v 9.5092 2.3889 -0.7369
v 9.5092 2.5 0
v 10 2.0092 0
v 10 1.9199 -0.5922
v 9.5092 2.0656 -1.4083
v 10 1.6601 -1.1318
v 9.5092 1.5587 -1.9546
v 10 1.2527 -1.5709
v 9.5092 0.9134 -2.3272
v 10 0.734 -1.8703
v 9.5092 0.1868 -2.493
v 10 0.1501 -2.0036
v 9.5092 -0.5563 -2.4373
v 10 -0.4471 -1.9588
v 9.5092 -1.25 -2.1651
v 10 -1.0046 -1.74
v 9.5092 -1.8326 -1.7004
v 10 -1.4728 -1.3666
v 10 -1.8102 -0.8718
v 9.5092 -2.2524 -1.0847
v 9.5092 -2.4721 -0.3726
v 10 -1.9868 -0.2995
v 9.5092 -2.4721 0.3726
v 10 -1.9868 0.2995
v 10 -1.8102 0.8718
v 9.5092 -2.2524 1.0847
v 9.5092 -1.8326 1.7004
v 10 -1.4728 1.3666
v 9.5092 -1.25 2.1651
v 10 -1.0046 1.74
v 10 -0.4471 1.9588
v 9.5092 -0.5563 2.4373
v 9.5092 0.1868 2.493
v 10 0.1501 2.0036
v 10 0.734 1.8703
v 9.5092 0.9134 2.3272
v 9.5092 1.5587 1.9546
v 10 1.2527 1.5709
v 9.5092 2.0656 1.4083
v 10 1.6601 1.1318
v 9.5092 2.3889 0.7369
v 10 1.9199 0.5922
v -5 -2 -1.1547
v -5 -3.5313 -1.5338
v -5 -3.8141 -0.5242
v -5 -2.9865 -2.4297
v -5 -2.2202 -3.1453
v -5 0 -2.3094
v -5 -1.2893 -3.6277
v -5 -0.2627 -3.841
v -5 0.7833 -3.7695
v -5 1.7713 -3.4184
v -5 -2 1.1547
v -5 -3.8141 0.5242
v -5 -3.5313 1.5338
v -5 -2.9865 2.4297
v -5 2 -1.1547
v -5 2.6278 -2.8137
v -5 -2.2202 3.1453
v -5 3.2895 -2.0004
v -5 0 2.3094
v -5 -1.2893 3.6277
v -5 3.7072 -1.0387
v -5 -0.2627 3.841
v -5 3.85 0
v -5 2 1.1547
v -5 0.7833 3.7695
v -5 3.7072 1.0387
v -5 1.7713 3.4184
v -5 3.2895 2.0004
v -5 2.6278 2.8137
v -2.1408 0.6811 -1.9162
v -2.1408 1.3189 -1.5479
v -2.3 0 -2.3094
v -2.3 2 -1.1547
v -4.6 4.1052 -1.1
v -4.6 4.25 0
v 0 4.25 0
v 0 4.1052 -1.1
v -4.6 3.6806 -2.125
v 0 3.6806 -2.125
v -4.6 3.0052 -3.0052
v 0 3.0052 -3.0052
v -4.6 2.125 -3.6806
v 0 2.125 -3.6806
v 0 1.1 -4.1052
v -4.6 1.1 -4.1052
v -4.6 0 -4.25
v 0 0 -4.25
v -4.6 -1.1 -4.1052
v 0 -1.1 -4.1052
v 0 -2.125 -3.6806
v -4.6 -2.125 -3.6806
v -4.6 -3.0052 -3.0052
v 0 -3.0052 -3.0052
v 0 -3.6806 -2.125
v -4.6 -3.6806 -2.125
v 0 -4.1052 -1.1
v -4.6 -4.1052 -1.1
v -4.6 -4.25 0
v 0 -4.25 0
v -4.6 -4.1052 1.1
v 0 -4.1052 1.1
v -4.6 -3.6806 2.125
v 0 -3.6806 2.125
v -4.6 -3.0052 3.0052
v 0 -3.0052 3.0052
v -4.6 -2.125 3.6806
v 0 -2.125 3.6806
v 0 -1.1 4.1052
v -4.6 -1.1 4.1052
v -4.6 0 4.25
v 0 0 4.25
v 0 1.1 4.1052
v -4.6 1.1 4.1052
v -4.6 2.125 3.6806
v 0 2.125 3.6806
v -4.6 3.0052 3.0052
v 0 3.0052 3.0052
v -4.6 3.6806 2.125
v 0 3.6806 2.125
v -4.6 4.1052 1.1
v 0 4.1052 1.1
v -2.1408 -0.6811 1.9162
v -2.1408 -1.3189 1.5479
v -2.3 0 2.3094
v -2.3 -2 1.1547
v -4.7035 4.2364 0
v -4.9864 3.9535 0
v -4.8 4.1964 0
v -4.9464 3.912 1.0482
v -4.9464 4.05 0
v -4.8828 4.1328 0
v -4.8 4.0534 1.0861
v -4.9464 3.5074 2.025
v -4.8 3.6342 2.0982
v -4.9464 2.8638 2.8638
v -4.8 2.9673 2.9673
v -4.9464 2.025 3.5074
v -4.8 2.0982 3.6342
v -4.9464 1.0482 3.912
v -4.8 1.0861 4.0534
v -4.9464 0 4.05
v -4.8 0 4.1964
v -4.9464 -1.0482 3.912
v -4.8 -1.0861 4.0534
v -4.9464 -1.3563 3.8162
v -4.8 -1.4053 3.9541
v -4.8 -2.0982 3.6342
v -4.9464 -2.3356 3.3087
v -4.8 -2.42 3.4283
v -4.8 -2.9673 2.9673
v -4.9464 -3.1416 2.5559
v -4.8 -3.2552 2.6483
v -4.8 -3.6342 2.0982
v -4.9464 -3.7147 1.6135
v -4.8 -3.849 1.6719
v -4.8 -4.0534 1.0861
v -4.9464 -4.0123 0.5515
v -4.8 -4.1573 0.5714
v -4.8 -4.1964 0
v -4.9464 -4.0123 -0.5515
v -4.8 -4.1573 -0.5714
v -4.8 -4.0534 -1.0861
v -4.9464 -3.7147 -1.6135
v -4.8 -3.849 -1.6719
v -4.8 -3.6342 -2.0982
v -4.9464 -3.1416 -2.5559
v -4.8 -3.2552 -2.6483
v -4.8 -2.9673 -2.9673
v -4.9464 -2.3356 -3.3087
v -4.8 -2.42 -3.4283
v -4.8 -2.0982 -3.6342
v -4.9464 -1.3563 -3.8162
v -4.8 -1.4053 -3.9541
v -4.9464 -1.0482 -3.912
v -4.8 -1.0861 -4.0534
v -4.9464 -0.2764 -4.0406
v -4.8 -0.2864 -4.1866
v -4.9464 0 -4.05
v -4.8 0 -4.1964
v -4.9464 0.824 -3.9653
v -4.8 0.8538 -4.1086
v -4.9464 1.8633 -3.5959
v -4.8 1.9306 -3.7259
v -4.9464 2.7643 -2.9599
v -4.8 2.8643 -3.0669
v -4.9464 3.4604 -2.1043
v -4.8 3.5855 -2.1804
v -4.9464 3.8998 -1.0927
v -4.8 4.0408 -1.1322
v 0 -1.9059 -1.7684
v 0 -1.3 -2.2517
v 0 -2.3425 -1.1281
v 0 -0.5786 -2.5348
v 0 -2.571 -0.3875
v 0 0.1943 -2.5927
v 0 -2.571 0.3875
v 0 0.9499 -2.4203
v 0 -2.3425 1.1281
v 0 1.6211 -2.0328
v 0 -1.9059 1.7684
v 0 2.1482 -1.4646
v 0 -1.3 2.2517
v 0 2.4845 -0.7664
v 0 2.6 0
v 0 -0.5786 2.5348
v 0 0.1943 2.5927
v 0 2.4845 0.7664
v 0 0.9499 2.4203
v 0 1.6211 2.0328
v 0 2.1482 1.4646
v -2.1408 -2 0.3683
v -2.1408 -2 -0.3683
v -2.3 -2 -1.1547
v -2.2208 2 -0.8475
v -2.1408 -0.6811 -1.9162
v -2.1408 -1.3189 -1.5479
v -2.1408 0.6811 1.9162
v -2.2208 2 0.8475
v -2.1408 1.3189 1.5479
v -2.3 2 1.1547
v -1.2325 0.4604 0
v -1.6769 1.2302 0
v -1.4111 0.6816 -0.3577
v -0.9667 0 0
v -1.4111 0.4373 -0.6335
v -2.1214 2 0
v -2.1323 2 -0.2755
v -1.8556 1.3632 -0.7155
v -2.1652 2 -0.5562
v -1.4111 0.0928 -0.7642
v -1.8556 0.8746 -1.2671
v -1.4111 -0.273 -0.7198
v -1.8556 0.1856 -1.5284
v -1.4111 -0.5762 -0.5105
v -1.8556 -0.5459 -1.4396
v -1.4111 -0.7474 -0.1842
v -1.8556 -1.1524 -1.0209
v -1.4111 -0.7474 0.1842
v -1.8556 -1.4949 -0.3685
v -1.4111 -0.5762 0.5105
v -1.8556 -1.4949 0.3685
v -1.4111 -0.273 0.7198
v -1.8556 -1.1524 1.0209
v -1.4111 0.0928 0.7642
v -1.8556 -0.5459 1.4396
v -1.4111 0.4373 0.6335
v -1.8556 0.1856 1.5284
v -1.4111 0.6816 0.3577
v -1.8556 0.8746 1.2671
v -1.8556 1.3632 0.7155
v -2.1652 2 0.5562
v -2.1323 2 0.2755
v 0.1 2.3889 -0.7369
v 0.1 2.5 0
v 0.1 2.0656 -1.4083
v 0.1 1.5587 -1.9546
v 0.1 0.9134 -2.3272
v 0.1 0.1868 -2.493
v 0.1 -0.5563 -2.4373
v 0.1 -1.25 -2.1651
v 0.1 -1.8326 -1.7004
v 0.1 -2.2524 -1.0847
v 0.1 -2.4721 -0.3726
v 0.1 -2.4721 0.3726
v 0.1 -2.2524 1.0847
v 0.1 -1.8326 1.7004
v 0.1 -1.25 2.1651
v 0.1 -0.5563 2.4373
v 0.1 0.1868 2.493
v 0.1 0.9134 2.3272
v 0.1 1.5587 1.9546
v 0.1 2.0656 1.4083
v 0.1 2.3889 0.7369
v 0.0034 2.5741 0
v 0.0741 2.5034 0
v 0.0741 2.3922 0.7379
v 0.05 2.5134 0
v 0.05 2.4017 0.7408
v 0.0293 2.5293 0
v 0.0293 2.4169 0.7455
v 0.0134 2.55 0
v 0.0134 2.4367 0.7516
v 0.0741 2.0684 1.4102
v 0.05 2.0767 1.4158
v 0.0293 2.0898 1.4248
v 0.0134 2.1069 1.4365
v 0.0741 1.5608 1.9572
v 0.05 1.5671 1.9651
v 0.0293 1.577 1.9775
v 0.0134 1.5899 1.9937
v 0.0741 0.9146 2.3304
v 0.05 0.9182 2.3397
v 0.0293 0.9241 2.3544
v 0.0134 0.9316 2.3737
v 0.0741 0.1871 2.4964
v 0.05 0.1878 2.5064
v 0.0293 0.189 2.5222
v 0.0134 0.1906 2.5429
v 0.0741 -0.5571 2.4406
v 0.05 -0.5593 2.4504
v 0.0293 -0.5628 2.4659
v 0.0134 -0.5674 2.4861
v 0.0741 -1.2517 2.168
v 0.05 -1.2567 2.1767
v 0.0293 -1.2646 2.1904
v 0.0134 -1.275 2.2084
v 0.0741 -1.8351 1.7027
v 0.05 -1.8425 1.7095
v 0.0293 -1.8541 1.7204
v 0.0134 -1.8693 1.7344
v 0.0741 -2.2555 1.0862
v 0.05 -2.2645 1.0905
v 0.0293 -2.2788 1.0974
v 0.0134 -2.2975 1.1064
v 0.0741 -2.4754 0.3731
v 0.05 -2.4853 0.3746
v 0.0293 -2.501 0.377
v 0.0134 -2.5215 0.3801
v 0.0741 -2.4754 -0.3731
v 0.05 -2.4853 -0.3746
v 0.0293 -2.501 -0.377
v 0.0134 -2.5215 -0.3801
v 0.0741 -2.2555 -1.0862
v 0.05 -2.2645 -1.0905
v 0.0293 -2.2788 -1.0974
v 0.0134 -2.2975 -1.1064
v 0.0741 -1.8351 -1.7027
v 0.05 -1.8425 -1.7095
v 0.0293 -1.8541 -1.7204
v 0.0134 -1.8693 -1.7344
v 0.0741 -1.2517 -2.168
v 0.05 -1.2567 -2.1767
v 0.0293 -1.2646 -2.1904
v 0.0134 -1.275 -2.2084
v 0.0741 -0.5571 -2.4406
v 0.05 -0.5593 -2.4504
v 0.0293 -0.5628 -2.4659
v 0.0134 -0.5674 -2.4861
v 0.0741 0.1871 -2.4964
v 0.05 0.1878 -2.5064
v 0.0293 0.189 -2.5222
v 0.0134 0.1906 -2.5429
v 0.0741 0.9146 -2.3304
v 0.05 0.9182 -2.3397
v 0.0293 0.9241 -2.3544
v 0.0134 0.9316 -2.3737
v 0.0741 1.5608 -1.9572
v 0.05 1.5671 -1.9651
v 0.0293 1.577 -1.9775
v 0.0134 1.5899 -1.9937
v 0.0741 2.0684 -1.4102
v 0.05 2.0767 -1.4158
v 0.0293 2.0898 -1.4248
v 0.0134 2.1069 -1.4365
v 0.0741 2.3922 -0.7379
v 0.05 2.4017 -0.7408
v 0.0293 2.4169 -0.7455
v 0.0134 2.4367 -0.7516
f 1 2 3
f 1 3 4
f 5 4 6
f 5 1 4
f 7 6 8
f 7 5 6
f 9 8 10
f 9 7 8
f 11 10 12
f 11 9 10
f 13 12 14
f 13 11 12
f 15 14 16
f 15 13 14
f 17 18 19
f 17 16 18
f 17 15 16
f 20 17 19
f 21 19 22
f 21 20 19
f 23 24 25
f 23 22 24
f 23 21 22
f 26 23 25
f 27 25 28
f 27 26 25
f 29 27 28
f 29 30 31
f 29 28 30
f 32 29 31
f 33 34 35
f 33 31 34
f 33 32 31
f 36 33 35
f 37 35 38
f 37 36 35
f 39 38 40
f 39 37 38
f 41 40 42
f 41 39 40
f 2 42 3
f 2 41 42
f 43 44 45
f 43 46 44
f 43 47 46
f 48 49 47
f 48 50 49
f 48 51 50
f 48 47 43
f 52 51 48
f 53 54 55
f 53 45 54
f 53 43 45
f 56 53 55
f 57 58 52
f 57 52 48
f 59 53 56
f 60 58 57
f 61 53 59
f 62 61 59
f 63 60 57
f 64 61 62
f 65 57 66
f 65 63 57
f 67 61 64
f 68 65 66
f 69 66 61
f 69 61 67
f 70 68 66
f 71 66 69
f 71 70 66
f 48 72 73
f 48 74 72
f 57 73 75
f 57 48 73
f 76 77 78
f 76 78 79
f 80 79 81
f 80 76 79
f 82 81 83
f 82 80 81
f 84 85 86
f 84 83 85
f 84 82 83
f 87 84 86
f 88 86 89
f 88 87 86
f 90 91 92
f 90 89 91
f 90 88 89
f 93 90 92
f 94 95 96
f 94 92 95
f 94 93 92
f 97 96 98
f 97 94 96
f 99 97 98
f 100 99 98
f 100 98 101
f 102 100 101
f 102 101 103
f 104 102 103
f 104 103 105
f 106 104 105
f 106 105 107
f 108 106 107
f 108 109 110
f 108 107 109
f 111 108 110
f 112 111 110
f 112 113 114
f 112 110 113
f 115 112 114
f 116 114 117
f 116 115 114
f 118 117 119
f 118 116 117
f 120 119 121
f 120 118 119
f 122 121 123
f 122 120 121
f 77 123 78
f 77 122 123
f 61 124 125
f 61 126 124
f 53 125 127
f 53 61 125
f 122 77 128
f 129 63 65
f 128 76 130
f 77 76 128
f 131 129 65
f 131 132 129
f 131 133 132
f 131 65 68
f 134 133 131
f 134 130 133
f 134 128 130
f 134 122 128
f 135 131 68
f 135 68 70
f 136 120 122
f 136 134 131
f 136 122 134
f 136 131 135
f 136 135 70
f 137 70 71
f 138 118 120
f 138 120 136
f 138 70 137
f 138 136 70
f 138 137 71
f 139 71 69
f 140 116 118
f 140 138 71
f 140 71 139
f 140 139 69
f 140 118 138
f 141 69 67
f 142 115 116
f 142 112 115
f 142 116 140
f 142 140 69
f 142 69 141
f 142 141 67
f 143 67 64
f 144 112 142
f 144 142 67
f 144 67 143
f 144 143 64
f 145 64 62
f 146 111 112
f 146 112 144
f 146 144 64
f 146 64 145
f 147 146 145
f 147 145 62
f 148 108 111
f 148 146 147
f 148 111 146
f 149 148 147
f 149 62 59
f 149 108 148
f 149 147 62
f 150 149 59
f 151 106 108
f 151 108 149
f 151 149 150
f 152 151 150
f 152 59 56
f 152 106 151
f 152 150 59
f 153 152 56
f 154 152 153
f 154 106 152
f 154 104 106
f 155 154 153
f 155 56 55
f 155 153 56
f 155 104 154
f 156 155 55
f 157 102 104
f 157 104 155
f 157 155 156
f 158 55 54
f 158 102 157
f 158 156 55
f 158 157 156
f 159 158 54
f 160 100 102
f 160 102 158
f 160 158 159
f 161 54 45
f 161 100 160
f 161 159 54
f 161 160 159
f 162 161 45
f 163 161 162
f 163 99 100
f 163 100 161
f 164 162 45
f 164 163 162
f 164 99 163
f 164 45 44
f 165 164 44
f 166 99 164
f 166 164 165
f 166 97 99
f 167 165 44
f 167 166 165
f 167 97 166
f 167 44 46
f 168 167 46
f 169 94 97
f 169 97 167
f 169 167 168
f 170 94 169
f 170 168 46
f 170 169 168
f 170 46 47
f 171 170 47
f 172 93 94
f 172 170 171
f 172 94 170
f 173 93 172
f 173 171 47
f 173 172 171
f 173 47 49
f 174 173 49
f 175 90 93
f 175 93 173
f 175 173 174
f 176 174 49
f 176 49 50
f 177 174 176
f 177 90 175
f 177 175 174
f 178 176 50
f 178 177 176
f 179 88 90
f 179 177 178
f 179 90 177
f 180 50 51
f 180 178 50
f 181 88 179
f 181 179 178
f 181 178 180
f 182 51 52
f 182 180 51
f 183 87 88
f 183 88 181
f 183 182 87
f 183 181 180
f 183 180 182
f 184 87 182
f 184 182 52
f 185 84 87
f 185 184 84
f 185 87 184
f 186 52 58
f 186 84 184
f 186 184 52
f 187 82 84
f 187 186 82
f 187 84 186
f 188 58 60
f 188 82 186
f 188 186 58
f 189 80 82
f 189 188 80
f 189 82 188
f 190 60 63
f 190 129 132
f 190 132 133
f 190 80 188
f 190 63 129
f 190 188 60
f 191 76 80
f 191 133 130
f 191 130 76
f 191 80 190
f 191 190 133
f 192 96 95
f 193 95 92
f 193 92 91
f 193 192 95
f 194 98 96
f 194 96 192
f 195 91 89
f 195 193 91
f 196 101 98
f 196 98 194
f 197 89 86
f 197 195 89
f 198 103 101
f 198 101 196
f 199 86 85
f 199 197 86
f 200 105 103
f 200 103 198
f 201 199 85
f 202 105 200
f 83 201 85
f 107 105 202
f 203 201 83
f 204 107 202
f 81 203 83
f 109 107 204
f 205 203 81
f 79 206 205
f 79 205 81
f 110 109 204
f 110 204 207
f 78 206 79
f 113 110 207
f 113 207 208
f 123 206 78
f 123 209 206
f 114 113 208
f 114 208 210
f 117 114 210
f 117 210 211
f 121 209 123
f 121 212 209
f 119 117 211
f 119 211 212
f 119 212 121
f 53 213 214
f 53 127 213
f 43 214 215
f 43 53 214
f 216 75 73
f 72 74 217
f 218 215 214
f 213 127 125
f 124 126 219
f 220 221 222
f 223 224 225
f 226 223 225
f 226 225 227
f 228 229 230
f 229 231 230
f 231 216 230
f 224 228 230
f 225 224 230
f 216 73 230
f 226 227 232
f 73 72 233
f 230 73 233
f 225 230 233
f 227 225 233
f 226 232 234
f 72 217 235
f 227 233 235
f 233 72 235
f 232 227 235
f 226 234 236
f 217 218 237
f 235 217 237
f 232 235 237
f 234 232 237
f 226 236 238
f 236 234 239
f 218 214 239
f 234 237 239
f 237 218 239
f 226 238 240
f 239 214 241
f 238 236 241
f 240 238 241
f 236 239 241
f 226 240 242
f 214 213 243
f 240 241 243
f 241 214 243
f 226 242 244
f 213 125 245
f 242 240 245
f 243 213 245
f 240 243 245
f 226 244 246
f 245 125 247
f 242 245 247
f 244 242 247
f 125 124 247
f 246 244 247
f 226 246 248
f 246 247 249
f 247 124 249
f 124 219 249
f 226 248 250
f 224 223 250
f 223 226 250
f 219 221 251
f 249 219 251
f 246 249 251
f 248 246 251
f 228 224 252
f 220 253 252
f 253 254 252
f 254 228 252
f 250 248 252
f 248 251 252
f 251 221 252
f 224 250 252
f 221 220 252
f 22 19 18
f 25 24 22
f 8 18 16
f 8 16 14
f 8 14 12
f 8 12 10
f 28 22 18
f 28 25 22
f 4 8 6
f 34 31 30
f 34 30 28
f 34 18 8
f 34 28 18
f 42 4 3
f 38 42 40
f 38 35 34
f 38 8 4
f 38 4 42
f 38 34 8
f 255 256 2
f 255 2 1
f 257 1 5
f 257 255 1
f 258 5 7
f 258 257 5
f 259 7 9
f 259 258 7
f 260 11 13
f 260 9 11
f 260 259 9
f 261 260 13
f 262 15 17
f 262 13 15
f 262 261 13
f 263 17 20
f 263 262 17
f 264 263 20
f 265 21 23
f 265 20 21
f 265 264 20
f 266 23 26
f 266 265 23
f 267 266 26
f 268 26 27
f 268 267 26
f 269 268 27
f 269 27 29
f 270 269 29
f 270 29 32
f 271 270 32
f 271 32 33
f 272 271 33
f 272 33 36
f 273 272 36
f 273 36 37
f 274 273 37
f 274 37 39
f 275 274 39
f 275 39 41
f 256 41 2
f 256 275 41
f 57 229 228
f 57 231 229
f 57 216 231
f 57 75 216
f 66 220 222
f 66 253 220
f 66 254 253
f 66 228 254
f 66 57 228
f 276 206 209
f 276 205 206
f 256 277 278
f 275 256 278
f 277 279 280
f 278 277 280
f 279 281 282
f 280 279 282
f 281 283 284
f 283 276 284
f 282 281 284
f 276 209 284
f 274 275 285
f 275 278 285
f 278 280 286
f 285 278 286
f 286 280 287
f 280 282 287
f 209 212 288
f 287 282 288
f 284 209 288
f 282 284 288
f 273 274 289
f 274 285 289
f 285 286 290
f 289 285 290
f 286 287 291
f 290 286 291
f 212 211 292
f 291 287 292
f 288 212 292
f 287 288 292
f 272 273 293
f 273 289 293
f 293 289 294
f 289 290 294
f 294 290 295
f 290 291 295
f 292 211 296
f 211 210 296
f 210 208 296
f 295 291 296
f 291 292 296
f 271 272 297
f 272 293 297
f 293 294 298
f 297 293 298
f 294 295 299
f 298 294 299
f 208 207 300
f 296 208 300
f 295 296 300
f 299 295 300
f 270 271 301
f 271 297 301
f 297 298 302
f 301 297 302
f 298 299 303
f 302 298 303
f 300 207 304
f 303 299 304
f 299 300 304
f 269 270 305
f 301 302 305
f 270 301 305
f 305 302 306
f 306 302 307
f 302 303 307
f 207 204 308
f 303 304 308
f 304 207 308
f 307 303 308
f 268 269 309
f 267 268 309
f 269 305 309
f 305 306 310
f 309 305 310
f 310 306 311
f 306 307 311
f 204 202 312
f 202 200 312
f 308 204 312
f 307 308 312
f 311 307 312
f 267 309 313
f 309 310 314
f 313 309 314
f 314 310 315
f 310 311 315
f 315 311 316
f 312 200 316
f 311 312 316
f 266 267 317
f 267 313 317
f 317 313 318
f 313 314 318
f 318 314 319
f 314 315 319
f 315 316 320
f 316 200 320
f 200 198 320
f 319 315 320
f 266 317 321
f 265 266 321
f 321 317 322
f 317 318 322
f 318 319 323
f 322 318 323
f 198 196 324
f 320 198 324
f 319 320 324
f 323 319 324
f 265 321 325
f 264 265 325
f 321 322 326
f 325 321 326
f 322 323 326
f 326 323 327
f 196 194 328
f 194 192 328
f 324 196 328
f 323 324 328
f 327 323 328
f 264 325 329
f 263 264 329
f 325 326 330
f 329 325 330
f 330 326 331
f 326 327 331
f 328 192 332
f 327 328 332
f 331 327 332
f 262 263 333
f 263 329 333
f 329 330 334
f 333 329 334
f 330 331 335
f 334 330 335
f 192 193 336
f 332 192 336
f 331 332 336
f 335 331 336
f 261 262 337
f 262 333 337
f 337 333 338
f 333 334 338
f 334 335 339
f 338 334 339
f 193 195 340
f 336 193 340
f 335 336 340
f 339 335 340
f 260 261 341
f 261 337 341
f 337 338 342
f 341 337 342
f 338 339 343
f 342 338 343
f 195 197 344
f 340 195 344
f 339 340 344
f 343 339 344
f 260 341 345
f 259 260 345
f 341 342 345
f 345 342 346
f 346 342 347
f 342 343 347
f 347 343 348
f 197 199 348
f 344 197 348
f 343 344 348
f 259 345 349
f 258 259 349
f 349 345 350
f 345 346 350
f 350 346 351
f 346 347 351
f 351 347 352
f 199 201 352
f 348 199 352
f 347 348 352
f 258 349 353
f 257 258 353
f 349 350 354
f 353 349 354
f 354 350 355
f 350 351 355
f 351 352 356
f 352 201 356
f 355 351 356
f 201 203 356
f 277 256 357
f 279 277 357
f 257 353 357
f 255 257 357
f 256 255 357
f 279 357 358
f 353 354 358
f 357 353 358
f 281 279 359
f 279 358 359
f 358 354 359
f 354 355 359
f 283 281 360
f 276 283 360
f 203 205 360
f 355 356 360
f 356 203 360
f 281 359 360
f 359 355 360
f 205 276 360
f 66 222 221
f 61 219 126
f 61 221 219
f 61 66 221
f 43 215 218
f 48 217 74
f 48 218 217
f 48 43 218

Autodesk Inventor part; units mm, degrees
ref_plane "YZ Plane" through (0, 0, 0) normal (1, 0, 0) x (0, 1, 0)
ref_plane "XZ Plane" through (0, 0, 0) normal (0, 1, 0) x (-1, 0, 0)
sketch "Szkic1" plane through (0, 0, 0) normal (0, 0, 1) x (1, 0, 0)
  line L0 (-0.9667, 0) -> (10, 0)
  line L1 (10, 0) -> (10, 2.5)
  line L2 (10, 2.5) -> (2, 2.5)
  line L3 (2, 2.5) -> (1.5091, 2.5)
  line L4 (1.5091, 2.5) -> (0, 2.5)
  line L5 (0, 2.5) -> (0, 4.25)
  line L6 (0, 4.25) -> (-5, 4.25)
  line L7 (-5, 4.25) -> (-5, 2.3094)
  line L8 (-5, 2.3094) -> (-2.3, 2.3094)
  line L9 (-2.3, 2.3094) -> (-0.9667, 0)
  line L10 (-8, 0) -> (13, 0) projected
  line L11 (0, -0.85) -> (0, 5.1) projected
  line L12 (2, 2.5) -> (0, 2.5) construction
  dimension "d1" = 8
  dimension "d2" = 0.4909
  dimension "d3" = 5
  dimension "d4" = 2.7
  dimension "d5" = 60
  dimension "d6" = 5
  dimension "d7" = 5
  dimension "d8" = 4.6188
  dimension "d9" = 8.5
  dimension "d26" = 10
revolve "Bryła" add sketch "Szkic1" angle 360 about axis through (-0.9667, 0, 0) along (1, 0, 0)
sketch "Szkic2" plane through (-5, 0, 0) normal (-1, 0, 0) x (0, 0, 1)
  circle A0 centre (0, 0) radius 2.3094 projected
  line L0 (0, -5.95) -> (0, 5.95) projected
  line L1 (-5.95, 0) -> (5.95, 0) projected
  line L2 (2.3094, 0) -> (1.1547, -2)
  line L3 (1.1547, -2) -> (-1.1547, -2)
  line L4 (-1.1547, -2) -> (-2.3094, 0)
  line L5 (-2.3094, 0) -> (-1.1547, 2)
  line L6 (-1.1547, 2) -> (1.1547, 2)
  line L7 (1.1547, 2) -> (2.3094, 0)
extrude "Szczelina" add sketch "Szkic2" against normal up to next contours L7 A0 | A0 L2 | L6 L0 A0 | A0 L0 L3 | L0 L6 A0 | A0 L3 L0 | L4 A0 | A0 L5
fillet "Zaokrąglenie1" radius 0.4 1 edges at (-5, -4.25, 0)
thread "Gwint" size "M5x0.8" class "6g" standard "ISO Metric profile" length 8
chamfer "Faza1" distance 0.4908 distance2 0.4908 1 edges at (10, -2.5, 0) measured on face at (10, -0.7741, -0.6858)
ref_plane "Work Plane1" through (29, 0, 0) normal (0, -1, 0) x (1, 0, 0)
fillet "Fillet2" radius 0.1 1 edges at (0, -2.5, 0)
equation "\"d1\" = GEL"
equation "\"d3\" = KOH"
equation "\"d4\" = INTI"
equation "\"d6\" = GD"
equation "\"d7\" = BDM"
equation "\"d8\" = 1.1547 * SW"
equation "\"d9\" = KOD"
equation "\"d26\" = NLG"
equation "\"d30\" = R"
equation "\"d17\" = RR"
equation "\"d13\" = GEL"
equation "\"d15\" = -0.5 * SPD + 0.5 * GD"
equation "\"d16\" = GUL"
equation "\"GD\" = NND"
equation "\"NLG\" = 10"
equation "\"GEL\" = 8"
equation "\"KOD\" = 8.5"
equation "\"KOH\" = NND"
equation "\"INTI\" = 2.7"
equation "\"GAL\" = 0.61345 * PTC"
equation "\"GUL\" = 0.61345 * PTC"
equation "\"BDM\" = NND"
equation "\"SW\" = 4"
equation "\"RR\" = 0.4"
equation "\"SPD\" = NND - 1.2269 * PTC"
equation "\"R\" = 0.1"
equation "\"TOA\" = 30deg"
equation "\"GD1\" = THREADDIA - 1.2269 * PTC"
equation "\"THREADDIA\" = 5"
equation "\"FAWI\" = 45deg"
equation "\"PTC\" = 0.8"
equation "\"NND\" = 5"
equation "\"E0\" = 1.155 * SW"
properties part number "CNS 3932 - M 5 x 10" material "Stal, miękka"
